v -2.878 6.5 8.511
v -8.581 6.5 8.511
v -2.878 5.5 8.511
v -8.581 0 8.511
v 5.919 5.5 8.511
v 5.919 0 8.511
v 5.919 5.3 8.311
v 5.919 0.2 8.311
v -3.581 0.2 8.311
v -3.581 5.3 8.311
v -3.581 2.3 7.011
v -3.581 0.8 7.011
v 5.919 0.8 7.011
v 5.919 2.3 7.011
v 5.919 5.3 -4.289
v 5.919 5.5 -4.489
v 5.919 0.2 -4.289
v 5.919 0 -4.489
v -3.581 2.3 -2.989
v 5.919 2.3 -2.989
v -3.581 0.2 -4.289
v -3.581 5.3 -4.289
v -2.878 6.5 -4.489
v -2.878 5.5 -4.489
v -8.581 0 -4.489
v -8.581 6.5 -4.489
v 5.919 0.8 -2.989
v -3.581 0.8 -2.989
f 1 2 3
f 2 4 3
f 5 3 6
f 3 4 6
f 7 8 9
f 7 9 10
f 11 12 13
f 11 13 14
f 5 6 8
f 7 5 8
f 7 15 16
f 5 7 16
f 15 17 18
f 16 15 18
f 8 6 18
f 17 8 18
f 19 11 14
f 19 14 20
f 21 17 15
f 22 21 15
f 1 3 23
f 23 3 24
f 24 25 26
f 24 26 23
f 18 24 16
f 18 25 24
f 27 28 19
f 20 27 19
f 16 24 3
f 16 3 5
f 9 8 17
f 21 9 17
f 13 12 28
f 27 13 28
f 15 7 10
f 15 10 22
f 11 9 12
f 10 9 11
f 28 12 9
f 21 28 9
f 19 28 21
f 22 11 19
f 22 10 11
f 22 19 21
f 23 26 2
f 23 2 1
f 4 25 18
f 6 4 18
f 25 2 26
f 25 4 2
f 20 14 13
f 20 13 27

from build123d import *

# Parameters (mm, degrees)
SKETCH_1_W          = 14.5
SKETCH_1_H          = 13
EXTRUDE_1_DEPTH     = 5.5
SKETCH_2_W          = 5.703148186
SKETCH_2_H          = 13
EXTRUDE_2_DEPTH     = 1
SKETCH_3_W          = 12.6
SKETCH_3_H          = 5.1
CUT_EXTRUDE_1_DEPTH = 9.5
SKETCH_4_W          = 10
SKETCH_4_H          = 1.5
EXTRUDE_3_DEPTH     = 9.5


with BuildPart() as part:
    # 草图1 → 凸台-拉伸1 (new body)
    with BuildSketch(Plane(origin=(0, 0, 0), x_dir=(1, 0, 0), z_dir=(0, 1, 0))):
        with Locations((-1.331183612, -2.01138088)):
            Rectangle(SKETCH_1_W, SKETCH_1_H)
    extrude(amount=EXTRUDE_1_DEPTH)

    # 草图2 → 凸台-拉伸2 (add)
    with BuildSketch(Plane(origin=(0, 5.5, 0), x_dir=(1, 0, 0), z_dir=(0, 1, 0))):
        with Locations((-5.729609519, -2.01138088)):
            Rectangle(SKETCH_2_W, SKETCH_2_H)
    extrude(amount=EXTRUDE_2_DEPTH)

    # 草图3 → 切除-拉伸1 (cut)
    with BuildSketch(Plane(origin=(5.918816388, 0, 0), x_dir=(0, 0, -1), z_dir=(1, 0, 0))):
        with Locations((-2.01138088, 2.75)):
            Rectangle(SKETCH_3_W, SKETCH_3_H)
    extrude(amount=-CUT_EXTRUDE_1_DEPTH, mode=Mode.SUBTRACT)

    # 草图4 → 凸台-拉伸3 (add)
    with BuildSketch(Plane(origin=(-3.581183612, 0, 0), x_dir=(0, 0, -1), z_dir=(1, 0, 0))):
        with Locations((-2.01138088, 1.55)):
            Rectangle(SKETCH_4_W, SKETCH_4_H)
    extrude(amount=EXTRUDE_3_DEPTH)


solid = part.part
